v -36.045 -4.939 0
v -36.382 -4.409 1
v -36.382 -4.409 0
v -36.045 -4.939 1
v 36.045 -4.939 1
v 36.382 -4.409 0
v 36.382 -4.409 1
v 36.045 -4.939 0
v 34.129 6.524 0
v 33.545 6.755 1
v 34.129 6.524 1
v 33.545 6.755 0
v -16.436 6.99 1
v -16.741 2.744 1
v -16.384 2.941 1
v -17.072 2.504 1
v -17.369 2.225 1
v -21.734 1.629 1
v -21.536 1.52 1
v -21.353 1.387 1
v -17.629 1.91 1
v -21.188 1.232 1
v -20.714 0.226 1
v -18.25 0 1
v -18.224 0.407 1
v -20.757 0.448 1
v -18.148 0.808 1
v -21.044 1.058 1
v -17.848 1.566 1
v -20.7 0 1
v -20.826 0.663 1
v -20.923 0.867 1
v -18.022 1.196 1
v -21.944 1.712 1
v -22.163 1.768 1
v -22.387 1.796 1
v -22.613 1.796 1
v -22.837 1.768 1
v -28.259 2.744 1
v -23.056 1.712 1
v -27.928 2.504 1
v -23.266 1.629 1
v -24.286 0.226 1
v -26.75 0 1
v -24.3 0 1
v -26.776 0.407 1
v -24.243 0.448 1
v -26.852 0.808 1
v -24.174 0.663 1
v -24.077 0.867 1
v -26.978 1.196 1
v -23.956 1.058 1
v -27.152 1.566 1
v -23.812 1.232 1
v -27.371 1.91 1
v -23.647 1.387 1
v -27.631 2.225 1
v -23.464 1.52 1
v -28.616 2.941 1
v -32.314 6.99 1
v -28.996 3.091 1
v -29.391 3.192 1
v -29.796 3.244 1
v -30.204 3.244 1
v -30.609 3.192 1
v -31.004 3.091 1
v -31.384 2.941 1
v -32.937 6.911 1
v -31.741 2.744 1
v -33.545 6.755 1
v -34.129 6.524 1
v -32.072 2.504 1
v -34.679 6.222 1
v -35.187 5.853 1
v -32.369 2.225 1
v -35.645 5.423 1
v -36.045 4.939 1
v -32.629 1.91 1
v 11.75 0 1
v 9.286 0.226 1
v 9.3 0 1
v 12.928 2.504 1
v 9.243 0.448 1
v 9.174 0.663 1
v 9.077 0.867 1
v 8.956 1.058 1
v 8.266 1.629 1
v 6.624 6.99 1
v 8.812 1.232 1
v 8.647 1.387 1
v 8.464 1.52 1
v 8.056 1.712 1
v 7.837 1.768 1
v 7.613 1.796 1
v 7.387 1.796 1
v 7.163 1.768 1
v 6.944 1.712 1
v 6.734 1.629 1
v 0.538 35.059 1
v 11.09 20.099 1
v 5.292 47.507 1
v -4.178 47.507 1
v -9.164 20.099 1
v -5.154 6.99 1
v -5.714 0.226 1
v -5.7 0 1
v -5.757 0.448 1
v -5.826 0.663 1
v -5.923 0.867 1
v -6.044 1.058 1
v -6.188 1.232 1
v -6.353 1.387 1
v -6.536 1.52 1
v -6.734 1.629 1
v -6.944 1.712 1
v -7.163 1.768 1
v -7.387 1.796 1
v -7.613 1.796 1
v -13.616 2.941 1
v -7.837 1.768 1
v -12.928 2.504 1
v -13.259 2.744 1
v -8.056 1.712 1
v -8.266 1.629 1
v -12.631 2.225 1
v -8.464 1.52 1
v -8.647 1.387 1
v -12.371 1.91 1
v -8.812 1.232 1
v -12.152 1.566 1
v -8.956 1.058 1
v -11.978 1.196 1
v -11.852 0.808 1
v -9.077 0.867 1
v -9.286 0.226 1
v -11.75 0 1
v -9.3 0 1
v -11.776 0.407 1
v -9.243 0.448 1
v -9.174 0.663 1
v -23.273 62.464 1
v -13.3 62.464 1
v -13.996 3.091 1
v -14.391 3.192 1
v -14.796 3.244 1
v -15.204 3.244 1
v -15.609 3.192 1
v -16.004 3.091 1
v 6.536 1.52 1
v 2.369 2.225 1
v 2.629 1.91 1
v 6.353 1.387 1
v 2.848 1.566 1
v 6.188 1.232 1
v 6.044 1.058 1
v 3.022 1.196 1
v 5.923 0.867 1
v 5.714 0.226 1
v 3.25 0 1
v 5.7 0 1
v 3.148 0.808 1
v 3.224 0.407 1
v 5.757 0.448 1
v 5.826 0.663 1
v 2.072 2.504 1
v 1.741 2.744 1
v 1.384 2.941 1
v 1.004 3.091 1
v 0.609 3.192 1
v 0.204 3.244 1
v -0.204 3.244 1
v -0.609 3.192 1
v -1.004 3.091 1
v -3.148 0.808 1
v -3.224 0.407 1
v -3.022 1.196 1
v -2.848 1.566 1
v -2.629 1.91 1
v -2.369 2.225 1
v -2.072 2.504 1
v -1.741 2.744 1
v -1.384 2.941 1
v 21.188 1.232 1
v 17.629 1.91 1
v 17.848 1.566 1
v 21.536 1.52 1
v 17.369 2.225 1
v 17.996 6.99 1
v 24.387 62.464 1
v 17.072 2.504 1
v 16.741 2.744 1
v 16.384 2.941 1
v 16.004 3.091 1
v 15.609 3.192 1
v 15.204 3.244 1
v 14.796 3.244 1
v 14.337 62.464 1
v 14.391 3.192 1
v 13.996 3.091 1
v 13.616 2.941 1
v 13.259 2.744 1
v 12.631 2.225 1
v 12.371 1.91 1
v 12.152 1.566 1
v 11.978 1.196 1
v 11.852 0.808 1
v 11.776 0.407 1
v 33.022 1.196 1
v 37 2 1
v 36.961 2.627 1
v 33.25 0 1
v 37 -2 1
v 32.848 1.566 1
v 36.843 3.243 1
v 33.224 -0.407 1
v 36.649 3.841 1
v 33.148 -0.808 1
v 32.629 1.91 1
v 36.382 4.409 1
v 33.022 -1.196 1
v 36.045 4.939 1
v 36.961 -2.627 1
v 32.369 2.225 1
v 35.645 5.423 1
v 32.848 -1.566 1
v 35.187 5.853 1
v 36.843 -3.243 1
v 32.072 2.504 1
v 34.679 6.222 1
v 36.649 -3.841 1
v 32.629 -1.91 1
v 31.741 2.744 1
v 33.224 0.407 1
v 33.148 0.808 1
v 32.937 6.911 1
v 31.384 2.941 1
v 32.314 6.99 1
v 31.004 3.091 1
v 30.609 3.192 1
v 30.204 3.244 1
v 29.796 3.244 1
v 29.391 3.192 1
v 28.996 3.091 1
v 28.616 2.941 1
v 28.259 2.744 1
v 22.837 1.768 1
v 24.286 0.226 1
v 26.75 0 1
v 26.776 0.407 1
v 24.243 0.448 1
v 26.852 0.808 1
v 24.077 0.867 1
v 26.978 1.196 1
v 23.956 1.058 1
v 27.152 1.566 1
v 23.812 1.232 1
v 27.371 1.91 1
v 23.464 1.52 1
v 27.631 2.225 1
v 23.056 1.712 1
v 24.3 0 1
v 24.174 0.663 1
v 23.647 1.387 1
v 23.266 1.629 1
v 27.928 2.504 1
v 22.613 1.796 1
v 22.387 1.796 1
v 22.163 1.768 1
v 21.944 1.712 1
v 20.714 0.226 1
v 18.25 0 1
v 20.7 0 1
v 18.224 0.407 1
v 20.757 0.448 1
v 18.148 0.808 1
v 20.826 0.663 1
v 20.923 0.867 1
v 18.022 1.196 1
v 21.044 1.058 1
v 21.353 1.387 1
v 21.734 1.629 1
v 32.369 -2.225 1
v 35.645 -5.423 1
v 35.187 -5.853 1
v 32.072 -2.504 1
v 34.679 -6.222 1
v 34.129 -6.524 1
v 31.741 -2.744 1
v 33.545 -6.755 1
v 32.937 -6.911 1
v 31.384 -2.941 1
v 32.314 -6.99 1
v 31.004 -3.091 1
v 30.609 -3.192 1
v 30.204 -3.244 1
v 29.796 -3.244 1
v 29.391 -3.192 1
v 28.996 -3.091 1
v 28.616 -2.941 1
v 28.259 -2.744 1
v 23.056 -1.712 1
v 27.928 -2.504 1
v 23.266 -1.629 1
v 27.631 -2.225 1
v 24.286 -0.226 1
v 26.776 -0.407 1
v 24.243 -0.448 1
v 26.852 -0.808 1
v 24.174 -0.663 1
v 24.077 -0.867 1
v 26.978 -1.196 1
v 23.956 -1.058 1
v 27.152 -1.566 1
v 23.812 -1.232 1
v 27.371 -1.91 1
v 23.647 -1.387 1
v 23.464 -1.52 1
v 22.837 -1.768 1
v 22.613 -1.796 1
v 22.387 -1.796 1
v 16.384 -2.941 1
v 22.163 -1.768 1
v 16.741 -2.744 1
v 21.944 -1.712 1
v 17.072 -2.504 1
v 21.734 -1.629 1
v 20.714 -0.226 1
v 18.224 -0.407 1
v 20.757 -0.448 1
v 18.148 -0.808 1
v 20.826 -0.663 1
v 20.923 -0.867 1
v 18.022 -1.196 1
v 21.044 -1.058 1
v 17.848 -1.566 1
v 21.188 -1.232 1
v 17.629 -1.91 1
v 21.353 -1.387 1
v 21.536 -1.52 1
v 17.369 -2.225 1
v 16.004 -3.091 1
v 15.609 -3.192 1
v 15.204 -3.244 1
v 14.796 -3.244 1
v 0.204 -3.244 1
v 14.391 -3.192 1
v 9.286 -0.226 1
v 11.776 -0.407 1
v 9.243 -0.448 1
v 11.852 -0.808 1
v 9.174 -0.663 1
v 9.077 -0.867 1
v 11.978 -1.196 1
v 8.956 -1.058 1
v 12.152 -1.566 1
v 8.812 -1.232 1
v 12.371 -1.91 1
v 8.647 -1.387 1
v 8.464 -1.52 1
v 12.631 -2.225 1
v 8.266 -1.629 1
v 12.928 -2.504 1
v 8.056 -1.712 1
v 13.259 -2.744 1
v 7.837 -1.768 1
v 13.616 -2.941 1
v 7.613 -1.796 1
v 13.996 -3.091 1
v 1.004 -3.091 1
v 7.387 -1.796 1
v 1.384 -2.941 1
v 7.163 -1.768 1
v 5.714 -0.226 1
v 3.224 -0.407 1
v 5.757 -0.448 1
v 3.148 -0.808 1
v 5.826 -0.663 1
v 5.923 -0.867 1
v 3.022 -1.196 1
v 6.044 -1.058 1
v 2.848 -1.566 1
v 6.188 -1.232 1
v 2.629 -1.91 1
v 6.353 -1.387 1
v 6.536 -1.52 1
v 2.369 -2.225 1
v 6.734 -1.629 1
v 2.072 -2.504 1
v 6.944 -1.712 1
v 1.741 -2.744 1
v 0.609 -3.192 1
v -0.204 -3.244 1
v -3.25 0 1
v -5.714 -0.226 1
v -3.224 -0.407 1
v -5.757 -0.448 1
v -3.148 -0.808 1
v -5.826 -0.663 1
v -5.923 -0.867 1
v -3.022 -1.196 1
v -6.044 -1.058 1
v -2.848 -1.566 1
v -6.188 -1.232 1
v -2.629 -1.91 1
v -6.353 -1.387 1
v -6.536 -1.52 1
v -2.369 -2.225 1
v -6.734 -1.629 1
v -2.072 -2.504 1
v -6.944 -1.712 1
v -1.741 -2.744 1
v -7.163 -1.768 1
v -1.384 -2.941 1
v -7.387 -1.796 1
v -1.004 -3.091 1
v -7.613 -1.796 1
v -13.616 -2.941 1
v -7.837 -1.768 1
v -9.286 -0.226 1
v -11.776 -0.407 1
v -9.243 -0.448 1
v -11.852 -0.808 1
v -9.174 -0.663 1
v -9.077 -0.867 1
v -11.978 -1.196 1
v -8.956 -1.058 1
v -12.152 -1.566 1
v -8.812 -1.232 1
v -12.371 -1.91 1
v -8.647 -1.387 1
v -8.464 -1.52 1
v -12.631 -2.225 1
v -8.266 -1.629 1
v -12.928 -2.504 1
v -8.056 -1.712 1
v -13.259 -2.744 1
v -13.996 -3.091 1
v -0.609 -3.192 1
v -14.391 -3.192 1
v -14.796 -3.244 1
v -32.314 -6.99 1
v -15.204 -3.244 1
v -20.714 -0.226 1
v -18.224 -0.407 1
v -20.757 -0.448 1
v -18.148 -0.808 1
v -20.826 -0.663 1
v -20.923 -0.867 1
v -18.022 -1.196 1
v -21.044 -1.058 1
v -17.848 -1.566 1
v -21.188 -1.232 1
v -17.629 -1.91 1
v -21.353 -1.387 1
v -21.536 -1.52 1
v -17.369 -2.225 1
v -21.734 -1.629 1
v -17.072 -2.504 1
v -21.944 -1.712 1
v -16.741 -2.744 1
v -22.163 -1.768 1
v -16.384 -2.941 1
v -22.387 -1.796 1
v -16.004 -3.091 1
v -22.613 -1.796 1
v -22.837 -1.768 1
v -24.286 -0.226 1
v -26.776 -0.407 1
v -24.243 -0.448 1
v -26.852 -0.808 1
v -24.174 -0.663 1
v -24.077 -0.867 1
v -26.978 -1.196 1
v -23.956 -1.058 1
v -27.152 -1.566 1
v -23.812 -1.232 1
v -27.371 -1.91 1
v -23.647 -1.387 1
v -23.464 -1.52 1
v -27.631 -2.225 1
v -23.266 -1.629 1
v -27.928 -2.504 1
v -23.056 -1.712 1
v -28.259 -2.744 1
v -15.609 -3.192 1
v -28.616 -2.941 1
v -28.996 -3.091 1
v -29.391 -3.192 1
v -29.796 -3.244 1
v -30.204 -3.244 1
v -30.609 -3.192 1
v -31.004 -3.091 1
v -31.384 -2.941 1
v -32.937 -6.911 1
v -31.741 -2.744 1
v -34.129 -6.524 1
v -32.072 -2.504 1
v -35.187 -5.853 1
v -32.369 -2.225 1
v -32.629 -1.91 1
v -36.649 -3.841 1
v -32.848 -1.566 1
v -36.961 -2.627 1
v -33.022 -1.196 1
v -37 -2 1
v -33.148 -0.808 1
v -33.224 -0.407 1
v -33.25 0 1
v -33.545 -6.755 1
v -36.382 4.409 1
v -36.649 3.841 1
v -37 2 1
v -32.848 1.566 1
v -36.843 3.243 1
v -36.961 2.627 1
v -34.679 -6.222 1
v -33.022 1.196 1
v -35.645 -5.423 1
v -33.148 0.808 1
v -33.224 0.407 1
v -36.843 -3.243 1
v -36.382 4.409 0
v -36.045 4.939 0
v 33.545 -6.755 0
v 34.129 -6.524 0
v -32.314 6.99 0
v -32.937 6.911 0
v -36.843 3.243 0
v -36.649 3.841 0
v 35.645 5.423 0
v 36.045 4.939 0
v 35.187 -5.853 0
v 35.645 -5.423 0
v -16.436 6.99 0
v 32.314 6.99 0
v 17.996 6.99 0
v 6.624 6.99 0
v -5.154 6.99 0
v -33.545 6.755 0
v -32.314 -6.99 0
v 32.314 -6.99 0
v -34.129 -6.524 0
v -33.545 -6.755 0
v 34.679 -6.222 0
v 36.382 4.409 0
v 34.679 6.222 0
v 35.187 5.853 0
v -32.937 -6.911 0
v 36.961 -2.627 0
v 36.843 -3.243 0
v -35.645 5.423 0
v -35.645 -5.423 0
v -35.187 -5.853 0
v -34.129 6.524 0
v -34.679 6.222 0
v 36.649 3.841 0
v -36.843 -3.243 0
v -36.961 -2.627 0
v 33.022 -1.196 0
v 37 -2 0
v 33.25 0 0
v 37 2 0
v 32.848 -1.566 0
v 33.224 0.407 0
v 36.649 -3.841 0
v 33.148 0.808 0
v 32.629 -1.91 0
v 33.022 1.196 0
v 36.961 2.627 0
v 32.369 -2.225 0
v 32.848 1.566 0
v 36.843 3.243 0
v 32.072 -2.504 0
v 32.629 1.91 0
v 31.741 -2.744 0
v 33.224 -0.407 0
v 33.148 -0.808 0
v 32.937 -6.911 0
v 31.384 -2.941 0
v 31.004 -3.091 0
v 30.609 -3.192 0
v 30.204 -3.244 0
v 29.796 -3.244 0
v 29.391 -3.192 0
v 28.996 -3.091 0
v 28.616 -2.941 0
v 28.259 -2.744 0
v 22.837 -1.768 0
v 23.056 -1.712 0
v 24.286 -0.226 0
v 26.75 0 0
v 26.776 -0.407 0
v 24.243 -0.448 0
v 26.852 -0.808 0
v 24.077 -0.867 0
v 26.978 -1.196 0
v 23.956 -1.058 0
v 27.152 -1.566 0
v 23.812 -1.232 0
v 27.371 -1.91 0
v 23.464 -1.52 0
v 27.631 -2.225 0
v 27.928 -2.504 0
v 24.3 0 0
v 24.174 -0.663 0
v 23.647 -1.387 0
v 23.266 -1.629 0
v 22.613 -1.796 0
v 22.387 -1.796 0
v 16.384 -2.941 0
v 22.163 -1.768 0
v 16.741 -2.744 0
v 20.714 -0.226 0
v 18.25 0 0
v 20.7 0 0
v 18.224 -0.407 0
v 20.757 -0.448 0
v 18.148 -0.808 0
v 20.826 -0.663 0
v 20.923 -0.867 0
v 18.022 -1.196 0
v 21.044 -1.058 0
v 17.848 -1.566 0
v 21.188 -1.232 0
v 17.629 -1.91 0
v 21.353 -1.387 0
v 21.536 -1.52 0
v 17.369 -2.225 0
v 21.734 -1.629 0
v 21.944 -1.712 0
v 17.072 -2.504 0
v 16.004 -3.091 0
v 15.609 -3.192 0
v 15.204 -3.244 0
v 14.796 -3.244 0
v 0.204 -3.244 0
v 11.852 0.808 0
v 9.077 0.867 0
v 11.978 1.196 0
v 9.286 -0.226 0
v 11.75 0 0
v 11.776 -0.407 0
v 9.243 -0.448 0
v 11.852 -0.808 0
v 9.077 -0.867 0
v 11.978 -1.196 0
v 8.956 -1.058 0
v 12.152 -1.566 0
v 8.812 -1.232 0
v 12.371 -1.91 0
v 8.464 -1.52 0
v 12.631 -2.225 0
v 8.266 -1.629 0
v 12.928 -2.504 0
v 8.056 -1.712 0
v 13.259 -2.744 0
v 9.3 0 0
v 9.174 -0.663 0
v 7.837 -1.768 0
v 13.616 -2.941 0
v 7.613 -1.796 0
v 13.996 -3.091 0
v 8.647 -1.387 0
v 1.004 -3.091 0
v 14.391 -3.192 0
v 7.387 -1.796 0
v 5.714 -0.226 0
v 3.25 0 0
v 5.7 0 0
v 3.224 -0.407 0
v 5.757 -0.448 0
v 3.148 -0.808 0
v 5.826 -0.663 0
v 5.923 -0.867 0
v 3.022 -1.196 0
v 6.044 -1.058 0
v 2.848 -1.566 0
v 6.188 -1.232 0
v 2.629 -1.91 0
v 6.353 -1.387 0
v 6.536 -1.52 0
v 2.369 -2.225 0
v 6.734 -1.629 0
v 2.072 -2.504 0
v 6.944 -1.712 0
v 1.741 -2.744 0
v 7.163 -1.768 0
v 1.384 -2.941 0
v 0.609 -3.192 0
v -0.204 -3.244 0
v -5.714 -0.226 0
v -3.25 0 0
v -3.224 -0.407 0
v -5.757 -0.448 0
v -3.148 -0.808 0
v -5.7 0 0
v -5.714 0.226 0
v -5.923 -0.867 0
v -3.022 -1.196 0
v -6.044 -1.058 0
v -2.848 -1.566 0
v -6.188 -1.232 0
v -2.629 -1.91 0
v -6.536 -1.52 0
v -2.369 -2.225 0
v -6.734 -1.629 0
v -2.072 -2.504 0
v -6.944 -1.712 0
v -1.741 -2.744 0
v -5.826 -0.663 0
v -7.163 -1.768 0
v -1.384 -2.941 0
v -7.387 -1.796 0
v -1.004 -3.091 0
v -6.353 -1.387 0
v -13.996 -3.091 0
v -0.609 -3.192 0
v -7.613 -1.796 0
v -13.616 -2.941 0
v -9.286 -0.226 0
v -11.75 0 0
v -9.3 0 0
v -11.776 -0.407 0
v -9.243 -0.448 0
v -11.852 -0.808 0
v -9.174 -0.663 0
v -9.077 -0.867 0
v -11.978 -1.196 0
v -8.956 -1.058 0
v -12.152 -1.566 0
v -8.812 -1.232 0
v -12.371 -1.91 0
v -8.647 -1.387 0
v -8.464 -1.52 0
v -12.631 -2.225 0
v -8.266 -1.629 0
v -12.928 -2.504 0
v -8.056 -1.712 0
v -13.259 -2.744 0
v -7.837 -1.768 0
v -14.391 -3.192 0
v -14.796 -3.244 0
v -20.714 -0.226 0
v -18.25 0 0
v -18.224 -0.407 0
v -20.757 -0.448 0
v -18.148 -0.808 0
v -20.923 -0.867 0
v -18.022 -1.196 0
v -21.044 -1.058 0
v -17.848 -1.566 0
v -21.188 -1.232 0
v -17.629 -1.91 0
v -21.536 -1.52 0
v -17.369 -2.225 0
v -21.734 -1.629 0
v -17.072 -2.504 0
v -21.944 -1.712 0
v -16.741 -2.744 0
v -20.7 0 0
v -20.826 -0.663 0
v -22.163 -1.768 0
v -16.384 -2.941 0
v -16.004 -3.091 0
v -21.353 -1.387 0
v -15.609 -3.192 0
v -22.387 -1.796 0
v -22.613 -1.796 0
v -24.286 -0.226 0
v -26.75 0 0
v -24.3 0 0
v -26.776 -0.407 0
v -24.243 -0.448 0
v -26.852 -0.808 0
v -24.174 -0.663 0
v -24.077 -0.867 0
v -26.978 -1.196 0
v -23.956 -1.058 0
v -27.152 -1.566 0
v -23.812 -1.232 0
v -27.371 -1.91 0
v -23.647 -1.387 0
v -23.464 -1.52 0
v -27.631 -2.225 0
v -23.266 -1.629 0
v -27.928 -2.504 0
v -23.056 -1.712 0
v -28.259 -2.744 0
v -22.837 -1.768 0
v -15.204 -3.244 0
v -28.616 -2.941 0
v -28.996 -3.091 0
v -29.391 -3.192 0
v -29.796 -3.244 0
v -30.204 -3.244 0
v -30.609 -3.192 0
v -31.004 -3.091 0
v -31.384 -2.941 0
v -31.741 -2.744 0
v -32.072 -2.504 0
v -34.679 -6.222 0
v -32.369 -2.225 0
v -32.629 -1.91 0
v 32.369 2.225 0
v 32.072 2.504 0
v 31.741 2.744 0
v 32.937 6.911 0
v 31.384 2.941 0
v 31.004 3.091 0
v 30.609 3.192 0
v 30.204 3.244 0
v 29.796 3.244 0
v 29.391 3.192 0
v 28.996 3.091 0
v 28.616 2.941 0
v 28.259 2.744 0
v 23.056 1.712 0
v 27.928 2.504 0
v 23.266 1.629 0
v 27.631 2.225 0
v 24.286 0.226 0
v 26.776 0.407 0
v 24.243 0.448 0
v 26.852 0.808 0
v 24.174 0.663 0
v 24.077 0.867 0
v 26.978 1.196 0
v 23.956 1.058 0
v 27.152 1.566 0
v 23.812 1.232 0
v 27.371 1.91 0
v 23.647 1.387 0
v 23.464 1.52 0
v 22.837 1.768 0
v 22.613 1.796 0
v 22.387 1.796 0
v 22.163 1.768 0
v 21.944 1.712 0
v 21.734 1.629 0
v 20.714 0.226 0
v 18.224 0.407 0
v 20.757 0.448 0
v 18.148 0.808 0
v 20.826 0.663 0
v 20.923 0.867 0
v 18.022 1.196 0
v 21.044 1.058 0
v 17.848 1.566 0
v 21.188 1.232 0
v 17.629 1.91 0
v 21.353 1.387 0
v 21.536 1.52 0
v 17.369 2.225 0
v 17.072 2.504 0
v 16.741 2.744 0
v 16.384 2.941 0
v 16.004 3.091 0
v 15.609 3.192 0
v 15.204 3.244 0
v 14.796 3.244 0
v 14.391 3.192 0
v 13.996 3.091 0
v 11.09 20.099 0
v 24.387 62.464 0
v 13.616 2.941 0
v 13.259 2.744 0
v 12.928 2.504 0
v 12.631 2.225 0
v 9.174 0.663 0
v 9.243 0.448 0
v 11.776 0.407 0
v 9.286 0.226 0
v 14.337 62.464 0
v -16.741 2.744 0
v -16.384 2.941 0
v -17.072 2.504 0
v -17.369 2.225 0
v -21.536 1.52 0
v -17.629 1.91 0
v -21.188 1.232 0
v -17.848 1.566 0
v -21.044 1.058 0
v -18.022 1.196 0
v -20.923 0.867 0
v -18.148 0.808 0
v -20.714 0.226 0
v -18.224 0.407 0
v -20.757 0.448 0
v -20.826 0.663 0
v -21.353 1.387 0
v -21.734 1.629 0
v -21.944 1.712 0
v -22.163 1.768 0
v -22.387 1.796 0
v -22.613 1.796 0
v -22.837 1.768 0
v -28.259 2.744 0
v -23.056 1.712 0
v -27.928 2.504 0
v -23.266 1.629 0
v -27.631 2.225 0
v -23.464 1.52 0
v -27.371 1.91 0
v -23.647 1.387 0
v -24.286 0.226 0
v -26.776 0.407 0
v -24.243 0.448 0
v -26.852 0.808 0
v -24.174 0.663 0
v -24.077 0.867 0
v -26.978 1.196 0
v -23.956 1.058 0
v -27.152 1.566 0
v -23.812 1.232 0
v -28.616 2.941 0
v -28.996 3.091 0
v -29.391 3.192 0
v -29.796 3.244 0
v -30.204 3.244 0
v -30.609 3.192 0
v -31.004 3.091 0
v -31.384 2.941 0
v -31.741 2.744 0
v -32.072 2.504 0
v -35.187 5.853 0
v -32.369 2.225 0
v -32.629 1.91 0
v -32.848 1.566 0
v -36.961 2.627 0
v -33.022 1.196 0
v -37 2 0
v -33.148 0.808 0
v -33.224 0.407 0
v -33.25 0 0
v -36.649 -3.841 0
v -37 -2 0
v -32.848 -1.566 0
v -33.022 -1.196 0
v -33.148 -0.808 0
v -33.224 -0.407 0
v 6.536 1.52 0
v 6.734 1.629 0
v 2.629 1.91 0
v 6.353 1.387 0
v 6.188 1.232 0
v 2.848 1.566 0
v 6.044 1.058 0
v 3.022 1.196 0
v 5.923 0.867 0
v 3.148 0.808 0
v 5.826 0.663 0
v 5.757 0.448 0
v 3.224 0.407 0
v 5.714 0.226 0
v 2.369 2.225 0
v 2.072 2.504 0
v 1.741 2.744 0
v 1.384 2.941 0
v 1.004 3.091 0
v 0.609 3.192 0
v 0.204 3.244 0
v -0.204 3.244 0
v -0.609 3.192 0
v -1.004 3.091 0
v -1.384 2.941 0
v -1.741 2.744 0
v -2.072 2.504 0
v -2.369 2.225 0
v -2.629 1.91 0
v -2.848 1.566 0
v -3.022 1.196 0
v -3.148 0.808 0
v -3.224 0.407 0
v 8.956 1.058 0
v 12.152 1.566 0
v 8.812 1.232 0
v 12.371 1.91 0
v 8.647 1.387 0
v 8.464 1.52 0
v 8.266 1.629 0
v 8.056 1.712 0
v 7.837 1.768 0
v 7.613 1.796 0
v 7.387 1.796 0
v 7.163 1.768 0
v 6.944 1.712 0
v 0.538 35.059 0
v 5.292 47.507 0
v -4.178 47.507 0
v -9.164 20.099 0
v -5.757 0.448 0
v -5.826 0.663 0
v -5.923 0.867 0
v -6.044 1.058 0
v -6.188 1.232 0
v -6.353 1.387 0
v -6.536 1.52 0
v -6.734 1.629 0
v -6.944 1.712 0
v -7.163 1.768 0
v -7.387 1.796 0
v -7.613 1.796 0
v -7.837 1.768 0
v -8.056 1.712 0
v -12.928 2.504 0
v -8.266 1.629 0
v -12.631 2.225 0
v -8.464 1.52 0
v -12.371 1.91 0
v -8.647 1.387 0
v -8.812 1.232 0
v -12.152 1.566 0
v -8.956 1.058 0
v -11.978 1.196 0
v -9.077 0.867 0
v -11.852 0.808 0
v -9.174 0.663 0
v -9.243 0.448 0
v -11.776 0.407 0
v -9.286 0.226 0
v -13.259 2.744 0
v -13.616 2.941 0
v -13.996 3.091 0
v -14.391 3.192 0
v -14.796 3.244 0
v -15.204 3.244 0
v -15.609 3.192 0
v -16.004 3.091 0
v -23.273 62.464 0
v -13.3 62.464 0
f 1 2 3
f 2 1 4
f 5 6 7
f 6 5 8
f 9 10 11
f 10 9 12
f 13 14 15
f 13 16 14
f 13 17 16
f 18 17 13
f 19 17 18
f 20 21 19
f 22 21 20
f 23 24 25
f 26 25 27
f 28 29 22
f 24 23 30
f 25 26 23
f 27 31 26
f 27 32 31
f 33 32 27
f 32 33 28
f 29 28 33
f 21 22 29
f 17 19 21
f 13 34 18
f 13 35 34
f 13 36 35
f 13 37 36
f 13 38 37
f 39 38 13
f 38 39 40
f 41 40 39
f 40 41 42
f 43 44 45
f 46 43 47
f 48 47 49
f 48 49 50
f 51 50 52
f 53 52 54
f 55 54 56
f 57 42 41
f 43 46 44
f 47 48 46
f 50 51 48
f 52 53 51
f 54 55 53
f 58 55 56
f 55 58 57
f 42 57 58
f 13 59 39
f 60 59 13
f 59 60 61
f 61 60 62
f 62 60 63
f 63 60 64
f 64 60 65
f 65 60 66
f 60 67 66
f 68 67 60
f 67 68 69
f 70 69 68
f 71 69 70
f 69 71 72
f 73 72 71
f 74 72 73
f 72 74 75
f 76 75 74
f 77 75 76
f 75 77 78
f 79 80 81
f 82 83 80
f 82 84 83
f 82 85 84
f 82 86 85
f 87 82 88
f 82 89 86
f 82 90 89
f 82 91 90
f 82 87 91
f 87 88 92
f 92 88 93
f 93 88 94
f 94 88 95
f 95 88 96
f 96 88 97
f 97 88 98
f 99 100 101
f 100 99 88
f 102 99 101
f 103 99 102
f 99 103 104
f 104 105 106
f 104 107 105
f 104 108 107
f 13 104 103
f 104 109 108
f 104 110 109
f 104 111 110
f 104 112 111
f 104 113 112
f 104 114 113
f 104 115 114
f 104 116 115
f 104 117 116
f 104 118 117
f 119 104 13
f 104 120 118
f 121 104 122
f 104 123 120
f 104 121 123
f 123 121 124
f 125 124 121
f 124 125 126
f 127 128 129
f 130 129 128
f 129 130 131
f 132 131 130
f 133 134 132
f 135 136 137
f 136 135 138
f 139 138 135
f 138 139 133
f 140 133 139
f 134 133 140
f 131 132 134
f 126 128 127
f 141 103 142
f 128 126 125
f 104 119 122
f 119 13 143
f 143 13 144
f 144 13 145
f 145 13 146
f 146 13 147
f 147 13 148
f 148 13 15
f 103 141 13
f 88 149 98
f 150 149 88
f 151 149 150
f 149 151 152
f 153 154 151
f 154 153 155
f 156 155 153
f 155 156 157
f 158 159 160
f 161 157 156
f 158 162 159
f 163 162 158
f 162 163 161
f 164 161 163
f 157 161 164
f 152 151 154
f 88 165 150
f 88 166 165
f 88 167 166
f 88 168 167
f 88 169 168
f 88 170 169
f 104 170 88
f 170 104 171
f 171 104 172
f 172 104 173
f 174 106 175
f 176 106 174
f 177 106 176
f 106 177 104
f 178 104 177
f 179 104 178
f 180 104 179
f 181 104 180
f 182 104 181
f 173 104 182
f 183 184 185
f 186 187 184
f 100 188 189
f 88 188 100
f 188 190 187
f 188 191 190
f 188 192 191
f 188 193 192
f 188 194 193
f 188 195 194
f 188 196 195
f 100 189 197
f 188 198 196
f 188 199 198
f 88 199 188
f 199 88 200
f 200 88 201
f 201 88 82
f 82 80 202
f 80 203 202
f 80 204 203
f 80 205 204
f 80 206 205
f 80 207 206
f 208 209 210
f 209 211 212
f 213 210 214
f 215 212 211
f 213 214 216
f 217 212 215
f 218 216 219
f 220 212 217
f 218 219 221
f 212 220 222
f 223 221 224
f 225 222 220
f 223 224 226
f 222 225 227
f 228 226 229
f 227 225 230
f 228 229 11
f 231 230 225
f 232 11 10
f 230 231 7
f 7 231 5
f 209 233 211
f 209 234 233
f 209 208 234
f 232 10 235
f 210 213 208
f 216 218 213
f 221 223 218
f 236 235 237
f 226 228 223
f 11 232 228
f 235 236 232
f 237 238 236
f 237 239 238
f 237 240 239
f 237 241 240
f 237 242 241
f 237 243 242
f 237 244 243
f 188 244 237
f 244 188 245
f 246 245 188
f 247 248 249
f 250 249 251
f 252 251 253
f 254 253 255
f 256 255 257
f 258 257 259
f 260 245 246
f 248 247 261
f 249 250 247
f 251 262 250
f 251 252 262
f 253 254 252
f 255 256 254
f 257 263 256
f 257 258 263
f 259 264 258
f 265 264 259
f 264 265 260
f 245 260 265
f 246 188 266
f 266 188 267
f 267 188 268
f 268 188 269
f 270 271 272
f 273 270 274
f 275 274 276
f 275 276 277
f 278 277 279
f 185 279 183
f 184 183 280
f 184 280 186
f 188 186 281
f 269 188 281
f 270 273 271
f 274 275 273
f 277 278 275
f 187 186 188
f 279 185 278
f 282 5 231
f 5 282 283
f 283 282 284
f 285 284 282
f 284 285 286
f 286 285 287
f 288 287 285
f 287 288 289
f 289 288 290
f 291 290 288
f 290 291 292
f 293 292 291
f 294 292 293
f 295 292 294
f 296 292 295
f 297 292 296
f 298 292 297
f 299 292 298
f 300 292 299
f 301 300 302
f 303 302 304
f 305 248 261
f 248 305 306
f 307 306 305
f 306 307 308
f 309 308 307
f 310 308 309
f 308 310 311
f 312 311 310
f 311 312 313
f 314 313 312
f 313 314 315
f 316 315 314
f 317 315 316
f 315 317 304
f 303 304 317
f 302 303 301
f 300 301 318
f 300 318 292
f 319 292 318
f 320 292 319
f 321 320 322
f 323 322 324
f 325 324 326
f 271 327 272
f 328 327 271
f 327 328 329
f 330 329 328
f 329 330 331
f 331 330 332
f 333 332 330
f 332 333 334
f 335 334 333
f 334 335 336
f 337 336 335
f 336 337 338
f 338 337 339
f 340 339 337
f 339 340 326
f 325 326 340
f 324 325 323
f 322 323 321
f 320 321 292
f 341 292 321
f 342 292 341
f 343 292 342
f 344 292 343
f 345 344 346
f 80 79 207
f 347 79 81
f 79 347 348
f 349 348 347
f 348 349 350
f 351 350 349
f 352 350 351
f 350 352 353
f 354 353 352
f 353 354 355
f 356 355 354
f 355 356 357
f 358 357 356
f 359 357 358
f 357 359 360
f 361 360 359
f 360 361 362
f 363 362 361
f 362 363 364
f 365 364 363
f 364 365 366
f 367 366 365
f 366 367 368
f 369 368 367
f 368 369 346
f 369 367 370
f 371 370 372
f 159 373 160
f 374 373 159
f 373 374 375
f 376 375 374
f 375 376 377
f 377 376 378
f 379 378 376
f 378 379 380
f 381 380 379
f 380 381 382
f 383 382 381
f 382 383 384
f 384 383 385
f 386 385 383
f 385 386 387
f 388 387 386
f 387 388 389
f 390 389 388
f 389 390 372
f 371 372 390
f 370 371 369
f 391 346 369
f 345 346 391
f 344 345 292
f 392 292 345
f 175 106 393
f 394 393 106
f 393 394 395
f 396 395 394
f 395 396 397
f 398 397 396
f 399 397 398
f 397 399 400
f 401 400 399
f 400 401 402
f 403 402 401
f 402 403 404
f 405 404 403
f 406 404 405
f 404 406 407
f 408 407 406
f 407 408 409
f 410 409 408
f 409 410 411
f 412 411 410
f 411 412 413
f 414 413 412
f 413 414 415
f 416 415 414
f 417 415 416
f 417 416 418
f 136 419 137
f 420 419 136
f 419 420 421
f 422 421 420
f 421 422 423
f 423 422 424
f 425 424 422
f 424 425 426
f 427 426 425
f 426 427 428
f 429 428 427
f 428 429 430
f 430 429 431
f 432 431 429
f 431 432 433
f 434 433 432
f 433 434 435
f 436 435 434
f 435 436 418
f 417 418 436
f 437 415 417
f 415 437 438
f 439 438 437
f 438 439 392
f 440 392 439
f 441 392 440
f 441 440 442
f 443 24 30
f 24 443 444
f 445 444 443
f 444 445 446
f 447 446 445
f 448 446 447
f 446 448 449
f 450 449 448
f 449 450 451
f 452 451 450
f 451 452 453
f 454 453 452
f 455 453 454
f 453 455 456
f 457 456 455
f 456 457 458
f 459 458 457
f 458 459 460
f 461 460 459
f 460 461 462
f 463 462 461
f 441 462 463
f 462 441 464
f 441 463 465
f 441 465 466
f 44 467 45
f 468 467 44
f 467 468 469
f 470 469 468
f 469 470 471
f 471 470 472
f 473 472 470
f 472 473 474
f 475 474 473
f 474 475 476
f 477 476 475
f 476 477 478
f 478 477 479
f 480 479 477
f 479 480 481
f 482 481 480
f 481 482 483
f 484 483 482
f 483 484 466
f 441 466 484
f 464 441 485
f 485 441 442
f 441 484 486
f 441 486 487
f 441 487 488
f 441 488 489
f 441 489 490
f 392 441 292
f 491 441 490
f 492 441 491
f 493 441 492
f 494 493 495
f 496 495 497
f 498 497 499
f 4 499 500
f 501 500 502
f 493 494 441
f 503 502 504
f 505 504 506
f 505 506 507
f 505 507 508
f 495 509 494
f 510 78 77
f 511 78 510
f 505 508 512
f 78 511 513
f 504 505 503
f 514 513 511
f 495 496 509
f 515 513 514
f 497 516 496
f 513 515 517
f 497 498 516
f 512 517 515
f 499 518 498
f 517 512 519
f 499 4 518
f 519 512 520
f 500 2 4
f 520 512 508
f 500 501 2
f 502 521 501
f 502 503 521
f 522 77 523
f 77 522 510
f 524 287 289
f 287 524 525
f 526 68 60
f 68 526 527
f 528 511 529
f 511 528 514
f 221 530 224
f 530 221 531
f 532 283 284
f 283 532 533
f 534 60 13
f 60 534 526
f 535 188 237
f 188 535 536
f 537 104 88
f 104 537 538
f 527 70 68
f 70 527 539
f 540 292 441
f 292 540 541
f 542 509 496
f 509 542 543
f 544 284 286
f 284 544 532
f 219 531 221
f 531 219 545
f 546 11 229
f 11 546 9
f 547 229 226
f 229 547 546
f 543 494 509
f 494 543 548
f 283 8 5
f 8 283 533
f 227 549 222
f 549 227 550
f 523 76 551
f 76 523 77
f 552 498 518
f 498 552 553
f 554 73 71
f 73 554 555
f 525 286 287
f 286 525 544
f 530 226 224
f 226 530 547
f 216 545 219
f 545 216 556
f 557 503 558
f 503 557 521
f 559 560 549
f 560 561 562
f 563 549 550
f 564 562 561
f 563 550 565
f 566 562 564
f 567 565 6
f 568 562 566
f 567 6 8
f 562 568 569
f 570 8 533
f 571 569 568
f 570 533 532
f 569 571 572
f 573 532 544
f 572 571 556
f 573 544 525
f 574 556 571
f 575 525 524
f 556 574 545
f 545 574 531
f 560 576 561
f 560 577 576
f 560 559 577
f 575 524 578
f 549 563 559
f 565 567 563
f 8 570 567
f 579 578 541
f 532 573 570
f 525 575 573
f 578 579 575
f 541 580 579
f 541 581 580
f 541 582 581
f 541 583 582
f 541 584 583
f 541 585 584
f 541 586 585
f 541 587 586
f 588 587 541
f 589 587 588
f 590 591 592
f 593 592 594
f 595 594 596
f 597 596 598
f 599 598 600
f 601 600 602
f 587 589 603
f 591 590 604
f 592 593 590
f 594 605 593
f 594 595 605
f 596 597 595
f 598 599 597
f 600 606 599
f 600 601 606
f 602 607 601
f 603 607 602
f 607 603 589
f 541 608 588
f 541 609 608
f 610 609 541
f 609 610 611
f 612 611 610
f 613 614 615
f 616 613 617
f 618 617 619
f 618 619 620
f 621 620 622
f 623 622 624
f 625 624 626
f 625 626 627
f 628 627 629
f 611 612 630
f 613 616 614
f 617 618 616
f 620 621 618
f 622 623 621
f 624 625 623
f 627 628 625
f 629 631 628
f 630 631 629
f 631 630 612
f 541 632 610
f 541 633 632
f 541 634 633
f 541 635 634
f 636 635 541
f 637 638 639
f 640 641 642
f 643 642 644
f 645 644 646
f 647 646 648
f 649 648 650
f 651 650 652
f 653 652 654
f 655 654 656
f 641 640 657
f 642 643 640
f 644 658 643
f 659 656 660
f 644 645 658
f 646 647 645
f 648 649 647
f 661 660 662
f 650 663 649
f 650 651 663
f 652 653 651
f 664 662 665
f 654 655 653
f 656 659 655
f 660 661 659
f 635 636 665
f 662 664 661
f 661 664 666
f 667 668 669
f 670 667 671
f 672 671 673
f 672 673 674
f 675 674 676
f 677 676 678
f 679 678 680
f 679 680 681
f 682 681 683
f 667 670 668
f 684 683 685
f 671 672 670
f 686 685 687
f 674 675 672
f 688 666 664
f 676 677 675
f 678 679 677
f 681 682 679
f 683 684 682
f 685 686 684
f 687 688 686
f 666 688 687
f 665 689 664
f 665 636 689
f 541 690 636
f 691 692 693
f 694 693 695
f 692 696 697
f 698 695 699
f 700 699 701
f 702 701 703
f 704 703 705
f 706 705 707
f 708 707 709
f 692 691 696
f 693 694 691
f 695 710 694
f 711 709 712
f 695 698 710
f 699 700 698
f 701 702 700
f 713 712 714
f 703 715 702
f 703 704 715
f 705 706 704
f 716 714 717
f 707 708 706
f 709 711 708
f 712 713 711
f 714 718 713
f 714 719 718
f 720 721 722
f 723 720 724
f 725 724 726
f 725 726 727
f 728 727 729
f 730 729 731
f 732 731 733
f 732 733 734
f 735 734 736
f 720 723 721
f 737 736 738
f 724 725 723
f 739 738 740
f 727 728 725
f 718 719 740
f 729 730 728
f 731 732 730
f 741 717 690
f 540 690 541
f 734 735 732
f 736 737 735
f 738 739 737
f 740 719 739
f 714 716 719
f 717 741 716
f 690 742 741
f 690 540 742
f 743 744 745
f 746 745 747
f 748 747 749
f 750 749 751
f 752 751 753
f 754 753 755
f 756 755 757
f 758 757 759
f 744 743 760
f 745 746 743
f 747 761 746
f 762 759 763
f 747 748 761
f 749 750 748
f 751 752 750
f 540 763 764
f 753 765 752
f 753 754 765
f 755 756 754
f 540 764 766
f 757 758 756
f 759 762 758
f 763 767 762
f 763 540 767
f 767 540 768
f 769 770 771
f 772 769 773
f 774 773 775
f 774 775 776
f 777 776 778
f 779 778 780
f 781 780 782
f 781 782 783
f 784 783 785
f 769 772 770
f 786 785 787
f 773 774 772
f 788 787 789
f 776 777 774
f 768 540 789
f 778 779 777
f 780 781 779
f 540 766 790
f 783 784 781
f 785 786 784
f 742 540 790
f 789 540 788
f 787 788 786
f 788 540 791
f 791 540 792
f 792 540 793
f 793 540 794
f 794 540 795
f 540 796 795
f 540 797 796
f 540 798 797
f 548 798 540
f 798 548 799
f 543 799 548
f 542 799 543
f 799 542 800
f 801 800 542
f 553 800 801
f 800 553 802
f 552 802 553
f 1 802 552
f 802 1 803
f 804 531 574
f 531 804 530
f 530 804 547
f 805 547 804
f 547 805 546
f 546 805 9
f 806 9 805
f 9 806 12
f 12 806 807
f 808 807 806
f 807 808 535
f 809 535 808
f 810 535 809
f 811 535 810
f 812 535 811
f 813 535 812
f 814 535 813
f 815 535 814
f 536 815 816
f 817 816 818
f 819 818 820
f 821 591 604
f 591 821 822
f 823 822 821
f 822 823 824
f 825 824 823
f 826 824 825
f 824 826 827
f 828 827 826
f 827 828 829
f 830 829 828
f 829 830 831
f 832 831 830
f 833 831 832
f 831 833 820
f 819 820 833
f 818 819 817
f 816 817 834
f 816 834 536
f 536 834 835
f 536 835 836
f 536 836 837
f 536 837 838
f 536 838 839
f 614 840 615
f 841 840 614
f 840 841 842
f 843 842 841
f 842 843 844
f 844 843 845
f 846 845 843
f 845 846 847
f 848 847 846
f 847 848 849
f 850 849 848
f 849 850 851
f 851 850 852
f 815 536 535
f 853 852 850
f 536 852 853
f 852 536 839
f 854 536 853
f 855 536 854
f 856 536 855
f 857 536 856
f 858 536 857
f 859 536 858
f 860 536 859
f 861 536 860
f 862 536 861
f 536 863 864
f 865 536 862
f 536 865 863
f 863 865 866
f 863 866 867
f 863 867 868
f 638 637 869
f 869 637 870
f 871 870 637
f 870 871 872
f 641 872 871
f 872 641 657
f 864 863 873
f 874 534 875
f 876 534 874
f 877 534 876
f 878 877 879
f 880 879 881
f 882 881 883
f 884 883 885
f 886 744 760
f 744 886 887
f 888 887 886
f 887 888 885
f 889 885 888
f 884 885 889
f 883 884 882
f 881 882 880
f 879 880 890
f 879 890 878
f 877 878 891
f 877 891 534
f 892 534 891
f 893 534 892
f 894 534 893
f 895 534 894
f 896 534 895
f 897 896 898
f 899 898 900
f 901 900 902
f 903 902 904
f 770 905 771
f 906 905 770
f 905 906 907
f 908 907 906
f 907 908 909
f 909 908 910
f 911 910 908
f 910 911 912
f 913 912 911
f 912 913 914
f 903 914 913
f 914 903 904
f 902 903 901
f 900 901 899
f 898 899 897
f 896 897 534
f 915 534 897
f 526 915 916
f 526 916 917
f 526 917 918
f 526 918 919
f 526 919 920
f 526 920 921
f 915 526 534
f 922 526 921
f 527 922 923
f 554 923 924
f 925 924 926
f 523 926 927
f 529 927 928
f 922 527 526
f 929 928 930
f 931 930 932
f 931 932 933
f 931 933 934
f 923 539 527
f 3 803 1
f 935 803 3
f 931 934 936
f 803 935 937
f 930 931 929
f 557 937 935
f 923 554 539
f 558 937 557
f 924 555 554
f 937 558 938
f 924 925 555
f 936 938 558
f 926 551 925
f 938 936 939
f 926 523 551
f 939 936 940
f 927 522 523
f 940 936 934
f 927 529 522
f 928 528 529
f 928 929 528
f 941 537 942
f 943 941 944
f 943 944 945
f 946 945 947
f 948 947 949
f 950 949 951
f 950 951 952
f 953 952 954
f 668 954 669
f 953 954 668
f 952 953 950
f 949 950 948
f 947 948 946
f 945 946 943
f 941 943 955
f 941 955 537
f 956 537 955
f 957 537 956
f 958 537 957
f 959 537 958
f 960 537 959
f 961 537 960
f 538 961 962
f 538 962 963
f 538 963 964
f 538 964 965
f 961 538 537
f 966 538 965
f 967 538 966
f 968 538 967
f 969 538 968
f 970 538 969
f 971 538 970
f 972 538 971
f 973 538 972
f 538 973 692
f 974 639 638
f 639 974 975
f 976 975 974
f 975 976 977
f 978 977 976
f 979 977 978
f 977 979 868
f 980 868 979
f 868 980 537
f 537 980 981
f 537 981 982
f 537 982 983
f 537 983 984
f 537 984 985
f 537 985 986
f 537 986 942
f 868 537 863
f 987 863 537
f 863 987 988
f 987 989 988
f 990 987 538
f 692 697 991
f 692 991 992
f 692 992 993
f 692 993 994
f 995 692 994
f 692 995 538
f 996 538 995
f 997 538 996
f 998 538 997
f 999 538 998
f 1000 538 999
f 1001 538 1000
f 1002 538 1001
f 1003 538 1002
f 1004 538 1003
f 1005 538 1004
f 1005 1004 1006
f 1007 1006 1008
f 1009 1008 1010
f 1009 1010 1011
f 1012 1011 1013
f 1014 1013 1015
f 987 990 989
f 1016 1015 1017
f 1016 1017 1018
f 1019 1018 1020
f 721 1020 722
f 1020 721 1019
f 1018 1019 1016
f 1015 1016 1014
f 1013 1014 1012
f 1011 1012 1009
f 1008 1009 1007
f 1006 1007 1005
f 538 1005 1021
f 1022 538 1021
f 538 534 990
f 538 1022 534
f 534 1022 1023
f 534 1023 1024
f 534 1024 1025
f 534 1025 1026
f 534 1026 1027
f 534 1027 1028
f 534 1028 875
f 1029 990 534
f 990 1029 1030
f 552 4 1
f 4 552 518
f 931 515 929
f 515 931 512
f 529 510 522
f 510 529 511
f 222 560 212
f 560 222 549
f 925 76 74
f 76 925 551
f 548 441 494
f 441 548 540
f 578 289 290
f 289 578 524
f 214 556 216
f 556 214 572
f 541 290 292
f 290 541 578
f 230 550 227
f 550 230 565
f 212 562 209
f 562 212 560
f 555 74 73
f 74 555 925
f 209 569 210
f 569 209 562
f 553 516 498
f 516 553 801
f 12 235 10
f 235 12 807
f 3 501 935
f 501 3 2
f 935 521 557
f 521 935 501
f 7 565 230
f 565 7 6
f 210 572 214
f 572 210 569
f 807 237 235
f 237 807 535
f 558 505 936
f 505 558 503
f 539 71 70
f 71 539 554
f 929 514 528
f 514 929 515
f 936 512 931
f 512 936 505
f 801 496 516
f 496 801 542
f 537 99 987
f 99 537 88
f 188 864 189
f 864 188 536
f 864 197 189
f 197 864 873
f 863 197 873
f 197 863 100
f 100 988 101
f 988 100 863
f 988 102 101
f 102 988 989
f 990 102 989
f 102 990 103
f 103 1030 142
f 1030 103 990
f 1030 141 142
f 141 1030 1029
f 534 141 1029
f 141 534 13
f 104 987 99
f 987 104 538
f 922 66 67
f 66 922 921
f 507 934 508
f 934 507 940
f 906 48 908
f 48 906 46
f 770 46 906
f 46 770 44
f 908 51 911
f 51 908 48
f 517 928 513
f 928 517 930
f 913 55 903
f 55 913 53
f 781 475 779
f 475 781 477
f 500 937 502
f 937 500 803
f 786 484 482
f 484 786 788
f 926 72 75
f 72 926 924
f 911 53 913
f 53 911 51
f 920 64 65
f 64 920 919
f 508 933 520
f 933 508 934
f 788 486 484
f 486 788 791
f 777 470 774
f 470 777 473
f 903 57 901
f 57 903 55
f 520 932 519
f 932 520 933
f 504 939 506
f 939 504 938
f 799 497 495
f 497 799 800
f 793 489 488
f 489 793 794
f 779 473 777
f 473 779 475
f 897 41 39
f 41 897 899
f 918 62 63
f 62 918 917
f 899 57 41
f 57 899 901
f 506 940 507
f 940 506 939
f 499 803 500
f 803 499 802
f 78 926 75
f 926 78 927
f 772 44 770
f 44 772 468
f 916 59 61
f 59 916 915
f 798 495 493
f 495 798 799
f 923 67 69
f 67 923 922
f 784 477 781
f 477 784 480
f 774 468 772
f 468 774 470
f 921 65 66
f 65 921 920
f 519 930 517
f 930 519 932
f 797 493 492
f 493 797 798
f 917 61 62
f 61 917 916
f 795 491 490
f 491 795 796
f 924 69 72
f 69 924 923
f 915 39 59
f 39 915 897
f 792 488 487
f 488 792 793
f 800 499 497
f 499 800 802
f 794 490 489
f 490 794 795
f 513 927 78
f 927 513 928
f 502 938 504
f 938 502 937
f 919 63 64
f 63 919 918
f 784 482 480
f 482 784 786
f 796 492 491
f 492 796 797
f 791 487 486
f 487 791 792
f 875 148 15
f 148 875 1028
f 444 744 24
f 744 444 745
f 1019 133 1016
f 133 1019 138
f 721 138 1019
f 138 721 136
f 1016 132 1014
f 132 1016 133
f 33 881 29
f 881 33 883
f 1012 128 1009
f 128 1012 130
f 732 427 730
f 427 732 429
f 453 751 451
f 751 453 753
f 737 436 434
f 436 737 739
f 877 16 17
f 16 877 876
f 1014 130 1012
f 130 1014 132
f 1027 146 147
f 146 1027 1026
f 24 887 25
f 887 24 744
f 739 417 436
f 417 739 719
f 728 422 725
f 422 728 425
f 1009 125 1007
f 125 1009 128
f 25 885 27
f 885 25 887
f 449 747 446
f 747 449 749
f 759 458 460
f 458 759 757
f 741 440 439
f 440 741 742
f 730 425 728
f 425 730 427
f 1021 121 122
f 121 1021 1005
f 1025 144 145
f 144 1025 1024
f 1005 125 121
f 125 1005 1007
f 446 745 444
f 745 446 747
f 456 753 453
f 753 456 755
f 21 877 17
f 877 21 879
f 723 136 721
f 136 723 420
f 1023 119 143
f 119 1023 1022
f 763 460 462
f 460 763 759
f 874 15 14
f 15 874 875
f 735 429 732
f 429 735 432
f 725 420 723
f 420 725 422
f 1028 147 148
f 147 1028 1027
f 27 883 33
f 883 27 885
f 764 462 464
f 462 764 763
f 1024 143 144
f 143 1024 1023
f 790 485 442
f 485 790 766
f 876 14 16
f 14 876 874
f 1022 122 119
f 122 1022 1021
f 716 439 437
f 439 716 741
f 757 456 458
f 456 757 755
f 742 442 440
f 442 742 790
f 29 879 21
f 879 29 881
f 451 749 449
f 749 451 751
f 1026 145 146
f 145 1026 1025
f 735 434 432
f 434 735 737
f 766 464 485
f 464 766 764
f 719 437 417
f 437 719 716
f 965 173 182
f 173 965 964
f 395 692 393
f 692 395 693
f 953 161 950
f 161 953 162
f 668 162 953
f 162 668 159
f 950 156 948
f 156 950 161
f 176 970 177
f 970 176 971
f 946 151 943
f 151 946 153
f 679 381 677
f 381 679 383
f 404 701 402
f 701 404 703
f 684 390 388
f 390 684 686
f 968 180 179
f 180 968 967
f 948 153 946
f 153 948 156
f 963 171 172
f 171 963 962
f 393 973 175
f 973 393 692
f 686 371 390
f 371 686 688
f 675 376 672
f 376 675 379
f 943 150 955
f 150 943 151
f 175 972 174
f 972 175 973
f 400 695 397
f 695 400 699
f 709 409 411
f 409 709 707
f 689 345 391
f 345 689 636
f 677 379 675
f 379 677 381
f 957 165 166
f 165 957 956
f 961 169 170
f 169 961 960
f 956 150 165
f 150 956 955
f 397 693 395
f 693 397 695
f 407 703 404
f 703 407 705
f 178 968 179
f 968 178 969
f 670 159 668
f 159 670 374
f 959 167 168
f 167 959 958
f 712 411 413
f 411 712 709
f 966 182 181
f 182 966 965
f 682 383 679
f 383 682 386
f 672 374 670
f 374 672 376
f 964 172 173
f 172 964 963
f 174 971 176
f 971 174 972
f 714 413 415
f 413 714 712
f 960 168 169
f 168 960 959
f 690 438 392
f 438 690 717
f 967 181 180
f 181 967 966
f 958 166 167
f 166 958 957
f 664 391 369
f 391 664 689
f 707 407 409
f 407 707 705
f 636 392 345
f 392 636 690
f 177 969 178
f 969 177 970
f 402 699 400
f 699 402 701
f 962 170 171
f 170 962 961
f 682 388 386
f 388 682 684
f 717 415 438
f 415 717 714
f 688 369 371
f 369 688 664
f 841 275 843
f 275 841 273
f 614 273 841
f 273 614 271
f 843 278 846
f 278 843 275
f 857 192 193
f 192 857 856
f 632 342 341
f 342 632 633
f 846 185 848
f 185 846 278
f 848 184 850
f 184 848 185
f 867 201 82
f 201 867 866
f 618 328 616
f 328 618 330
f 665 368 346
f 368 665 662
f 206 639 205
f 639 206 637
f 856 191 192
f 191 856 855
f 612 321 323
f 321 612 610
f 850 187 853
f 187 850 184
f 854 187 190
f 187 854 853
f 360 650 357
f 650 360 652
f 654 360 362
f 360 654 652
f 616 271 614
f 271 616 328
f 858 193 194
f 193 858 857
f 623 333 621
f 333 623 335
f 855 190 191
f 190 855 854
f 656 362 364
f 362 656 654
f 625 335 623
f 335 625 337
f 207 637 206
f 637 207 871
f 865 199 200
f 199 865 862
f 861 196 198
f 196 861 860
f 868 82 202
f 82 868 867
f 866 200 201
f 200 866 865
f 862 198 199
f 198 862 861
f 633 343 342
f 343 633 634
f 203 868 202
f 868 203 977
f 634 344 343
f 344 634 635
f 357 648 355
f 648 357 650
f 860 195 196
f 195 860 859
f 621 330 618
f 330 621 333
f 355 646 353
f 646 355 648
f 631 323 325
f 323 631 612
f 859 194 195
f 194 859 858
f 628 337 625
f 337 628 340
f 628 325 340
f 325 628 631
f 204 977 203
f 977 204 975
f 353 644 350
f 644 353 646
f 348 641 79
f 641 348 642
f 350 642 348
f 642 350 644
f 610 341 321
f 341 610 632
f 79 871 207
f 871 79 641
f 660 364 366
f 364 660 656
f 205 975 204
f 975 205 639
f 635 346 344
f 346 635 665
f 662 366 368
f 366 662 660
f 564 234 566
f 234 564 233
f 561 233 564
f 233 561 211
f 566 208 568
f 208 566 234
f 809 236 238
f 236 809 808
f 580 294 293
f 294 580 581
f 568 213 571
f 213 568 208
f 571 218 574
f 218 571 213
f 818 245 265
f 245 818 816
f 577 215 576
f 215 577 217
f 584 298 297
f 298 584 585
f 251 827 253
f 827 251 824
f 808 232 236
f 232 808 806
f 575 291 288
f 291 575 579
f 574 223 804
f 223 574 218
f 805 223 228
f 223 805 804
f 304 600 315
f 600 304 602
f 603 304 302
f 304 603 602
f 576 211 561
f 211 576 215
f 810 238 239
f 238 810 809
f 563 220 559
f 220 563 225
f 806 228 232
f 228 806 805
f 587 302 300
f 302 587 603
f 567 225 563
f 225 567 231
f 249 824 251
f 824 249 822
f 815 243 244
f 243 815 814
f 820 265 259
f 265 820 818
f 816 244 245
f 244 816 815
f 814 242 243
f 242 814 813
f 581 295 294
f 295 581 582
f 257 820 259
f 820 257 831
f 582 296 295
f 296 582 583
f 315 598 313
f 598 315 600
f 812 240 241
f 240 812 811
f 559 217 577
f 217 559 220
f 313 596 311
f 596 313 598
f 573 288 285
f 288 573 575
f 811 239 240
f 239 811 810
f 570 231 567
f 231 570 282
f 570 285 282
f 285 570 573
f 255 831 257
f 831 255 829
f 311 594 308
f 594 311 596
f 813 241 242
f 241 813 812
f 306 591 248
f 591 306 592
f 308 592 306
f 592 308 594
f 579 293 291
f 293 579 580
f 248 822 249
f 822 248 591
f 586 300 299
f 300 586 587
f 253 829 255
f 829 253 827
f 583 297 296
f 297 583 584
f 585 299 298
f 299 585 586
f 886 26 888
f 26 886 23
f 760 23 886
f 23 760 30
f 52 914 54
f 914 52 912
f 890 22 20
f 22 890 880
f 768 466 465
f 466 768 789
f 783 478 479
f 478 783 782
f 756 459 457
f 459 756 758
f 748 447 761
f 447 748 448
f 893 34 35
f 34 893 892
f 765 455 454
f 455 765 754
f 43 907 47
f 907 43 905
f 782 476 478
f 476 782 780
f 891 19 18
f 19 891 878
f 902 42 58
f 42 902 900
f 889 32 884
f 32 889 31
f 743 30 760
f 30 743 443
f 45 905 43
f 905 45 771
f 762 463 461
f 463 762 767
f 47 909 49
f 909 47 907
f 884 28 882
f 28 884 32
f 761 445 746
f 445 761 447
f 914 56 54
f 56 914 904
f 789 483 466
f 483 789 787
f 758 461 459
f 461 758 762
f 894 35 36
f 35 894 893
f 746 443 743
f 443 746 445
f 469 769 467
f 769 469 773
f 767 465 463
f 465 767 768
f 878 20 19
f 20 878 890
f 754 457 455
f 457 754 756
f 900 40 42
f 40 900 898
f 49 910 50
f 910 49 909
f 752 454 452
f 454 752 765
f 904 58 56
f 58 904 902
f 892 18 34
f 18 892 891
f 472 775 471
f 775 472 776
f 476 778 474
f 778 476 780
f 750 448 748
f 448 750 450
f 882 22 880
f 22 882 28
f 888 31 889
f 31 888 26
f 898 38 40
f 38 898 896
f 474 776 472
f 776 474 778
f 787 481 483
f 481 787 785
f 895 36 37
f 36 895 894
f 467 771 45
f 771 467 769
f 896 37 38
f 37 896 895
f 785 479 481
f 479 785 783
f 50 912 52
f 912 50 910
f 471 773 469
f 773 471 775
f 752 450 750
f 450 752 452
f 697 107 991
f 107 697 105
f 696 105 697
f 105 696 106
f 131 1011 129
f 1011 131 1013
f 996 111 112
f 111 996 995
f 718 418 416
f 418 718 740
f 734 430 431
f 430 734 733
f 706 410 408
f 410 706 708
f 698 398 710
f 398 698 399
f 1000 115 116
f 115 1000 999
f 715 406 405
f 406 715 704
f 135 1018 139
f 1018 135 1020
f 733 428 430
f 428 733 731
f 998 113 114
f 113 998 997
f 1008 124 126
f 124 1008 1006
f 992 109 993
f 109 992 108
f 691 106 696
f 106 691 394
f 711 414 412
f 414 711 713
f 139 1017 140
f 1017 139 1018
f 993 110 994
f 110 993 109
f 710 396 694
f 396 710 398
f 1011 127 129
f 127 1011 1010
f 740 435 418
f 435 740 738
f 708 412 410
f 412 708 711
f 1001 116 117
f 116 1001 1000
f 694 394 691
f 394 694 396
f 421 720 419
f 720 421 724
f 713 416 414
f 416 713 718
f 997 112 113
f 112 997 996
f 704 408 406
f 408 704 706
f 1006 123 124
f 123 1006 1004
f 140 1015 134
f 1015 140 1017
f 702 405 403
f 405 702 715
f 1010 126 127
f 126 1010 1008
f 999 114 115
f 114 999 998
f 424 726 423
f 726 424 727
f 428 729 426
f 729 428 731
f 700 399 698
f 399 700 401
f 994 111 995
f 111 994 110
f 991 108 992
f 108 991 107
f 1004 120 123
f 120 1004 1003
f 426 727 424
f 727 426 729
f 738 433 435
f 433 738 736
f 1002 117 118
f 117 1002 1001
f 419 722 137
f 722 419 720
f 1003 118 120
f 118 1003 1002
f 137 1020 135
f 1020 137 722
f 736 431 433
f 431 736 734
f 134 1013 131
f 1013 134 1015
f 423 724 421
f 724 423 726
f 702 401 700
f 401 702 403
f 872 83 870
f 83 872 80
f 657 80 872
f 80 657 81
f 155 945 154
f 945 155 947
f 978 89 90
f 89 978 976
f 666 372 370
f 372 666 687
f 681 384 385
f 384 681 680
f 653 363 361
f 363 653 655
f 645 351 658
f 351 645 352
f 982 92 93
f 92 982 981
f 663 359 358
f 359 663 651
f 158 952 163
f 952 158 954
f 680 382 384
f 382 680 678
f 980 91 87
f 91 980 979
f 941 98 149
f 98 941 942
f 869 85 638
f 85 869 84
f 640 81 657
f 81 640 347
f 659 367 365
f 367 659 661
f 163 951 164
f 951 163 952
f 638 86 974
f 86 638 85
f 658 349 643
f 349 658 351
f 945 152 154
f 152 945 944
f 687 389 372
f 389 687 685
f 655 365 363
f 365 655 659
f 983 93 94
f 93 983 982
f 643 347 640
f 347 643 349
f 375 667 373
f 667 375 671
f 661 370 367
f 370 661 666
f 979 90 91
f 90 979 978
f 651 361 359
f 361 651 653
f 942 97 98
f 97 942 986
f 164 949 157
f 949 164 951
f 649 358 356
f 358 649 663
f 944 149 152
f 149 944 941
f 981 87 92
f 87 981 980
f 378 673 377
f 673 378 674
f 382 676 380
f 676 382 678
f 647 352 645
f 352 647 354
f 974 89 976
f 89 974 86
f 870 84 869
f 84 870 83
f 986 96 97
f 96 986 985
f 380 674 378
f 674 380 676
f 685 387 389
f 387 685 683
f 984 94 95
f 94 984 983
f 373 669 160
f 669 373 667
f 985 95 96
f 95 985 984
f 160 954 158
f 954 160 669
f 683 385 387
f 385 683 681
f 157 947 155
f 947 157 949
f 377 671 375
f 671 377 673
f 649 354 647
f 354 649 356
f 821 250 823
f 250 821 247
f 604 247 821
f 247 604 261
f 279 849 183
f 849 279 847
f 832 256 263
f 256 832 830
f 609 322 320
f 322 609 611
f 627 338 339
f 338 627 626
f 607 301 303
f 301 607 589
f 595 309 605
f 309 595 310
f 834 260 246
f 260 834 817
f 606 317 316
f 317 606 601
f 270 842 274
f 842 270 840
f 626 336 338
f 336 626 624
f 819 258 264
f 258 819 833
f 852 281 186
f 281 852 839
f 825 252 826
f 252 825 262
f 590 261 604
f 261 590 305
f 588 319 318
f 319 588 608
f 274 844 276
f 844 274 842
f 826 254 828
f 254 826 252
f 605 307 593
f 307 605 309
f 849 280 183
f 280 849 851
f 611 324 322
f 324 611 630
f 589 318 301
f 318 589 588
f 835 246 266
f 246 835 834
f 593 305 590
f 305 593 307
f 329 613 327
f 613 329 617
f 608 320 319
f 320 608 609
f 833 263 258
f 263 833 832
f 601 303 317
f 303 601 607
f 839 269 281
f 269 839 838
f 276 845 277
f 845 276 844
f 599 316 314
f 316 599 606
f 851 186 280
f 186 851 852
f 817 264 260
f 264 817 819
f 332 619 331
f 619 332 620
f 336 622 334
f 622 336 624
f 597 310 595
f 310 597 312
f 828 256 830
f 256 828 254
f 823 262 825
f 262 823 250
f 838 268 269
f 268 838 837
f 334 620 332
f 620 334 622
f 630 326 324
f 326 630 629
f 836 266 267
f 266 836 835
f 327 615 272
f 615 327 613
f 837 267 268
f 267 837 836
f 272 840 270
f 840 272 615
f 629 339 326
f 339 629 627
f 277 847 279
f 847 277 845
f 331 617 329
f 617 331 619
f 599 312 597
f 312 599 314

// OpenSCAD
$fn = 50;


difference() {
	union() {
		hull() {
			translate(v = [-32.0000000000, 2.0000000000, 0]) {
				cylinder(h = 1, r = 5);
			}
			translate(v = [32.0000000000, 2.0000000000, 0]) {
				cylinder(h = 1, r = 5);
			}
			translate(v = [-32.0000000000, -2.0000000000, 0]) {
				cylinder(h = 1, r = 5);
			}
			translate(v = [32.0000000000, -2.0000000000, 0]) {
				cylinder(h = 1, r = 5);
			}
		}
		translate(v = [0, 61.1111111111, 0]) {
			linear_extrude(height = 1) {
				text(font = "DejaVu Sans Mono:style=Bold", halign = "center", size = 57.0000000000, text = "W", valign = "top");
			}
		}
	}
	union() {
		translate(v = [-30.0000000000, 0.0000000000, 0]) {
			translate(v = [0, 0, -100]) {
				cylinder(h = 200, r = 3.2500000000);
			}
		}
		translate(v = [-15.0000000000, 0.0000000000, 0]) {
			translate(v = [0, 0, -100]) {
				cylinder(h = 200, r = 3.2500000000);
			}
		}
		translate(v = [0, 0, -100]) {
			cylinder(h = 200, r = 3.2500000000);
		}
		translate(v = [15.0000000000, 0.0000000000, 0]) {
			translate(v = [0, 0, -100]) {
				cylinder(h = 200, r = 3.2500000000);
			}
		}
		translate(v = [30.0000000000, 0.0000000000, 0]) {
			translate(v = [0, 0, -100]) {
				cylinder(h = 200, r = 3.2500000000);
			}
		}
		translate(v = [-30.0000000000, 0.0000000000, 0]) {
			translate(v = [0, 0, -100]) {
				cylinder(h = 200, r = 1.8000000000);
			}
		}
		translate(v = [-22.5000000000, 0.0000000000, 0]) {
			translate(v = [0, 0, -100]) {
				cylinder(h = 200, r = 1.8000000000);
			}
		}
		translate(v = [-15.0000000000, 0.0000000000, 0]) {
			translate(v = [0, 0, -100]) {
				cylinder(h = 200, r = 1.8000000000);
			}
		}
		translate(v = [-7.5000000000, 0.0000000000, 0]) {
			translate(v = [0, 0, -100]) {
				cylinder(h = 200, r = 1.8000000000);
			}
		}
		translate(v = [0, 0, -100]) {
			cylinder(h = 200, r = 1.8000000000);
		}
		translate(v = [7.5000000000, 0.0000000000, 0]) {
			translate(v = [0, 0, -100]) {
				cylinder(h = 200, r = 1.8000000000);
			}
		}
		translate(v = [15.0000000000, 0.0000000000, 0]) {
			translate(v = [0, 0, -100]) {
				cylinder(h = 200, r = 1.8000000000);
			}
		}
		translate(v = [22.5000000000, 0.0000000000, 0]) {
			translate(v = [0, 0, -100]) {
				cylinder(h = 200, r = 1.8000000000);
			}
		}
		translate(v = [30.0000000000, 0.0000000000, 0]) {
			translate(v = [0, 0, -100]) {
				cylinder(h = 200, r = 1.8000000000);
			}
		}
	}
}
